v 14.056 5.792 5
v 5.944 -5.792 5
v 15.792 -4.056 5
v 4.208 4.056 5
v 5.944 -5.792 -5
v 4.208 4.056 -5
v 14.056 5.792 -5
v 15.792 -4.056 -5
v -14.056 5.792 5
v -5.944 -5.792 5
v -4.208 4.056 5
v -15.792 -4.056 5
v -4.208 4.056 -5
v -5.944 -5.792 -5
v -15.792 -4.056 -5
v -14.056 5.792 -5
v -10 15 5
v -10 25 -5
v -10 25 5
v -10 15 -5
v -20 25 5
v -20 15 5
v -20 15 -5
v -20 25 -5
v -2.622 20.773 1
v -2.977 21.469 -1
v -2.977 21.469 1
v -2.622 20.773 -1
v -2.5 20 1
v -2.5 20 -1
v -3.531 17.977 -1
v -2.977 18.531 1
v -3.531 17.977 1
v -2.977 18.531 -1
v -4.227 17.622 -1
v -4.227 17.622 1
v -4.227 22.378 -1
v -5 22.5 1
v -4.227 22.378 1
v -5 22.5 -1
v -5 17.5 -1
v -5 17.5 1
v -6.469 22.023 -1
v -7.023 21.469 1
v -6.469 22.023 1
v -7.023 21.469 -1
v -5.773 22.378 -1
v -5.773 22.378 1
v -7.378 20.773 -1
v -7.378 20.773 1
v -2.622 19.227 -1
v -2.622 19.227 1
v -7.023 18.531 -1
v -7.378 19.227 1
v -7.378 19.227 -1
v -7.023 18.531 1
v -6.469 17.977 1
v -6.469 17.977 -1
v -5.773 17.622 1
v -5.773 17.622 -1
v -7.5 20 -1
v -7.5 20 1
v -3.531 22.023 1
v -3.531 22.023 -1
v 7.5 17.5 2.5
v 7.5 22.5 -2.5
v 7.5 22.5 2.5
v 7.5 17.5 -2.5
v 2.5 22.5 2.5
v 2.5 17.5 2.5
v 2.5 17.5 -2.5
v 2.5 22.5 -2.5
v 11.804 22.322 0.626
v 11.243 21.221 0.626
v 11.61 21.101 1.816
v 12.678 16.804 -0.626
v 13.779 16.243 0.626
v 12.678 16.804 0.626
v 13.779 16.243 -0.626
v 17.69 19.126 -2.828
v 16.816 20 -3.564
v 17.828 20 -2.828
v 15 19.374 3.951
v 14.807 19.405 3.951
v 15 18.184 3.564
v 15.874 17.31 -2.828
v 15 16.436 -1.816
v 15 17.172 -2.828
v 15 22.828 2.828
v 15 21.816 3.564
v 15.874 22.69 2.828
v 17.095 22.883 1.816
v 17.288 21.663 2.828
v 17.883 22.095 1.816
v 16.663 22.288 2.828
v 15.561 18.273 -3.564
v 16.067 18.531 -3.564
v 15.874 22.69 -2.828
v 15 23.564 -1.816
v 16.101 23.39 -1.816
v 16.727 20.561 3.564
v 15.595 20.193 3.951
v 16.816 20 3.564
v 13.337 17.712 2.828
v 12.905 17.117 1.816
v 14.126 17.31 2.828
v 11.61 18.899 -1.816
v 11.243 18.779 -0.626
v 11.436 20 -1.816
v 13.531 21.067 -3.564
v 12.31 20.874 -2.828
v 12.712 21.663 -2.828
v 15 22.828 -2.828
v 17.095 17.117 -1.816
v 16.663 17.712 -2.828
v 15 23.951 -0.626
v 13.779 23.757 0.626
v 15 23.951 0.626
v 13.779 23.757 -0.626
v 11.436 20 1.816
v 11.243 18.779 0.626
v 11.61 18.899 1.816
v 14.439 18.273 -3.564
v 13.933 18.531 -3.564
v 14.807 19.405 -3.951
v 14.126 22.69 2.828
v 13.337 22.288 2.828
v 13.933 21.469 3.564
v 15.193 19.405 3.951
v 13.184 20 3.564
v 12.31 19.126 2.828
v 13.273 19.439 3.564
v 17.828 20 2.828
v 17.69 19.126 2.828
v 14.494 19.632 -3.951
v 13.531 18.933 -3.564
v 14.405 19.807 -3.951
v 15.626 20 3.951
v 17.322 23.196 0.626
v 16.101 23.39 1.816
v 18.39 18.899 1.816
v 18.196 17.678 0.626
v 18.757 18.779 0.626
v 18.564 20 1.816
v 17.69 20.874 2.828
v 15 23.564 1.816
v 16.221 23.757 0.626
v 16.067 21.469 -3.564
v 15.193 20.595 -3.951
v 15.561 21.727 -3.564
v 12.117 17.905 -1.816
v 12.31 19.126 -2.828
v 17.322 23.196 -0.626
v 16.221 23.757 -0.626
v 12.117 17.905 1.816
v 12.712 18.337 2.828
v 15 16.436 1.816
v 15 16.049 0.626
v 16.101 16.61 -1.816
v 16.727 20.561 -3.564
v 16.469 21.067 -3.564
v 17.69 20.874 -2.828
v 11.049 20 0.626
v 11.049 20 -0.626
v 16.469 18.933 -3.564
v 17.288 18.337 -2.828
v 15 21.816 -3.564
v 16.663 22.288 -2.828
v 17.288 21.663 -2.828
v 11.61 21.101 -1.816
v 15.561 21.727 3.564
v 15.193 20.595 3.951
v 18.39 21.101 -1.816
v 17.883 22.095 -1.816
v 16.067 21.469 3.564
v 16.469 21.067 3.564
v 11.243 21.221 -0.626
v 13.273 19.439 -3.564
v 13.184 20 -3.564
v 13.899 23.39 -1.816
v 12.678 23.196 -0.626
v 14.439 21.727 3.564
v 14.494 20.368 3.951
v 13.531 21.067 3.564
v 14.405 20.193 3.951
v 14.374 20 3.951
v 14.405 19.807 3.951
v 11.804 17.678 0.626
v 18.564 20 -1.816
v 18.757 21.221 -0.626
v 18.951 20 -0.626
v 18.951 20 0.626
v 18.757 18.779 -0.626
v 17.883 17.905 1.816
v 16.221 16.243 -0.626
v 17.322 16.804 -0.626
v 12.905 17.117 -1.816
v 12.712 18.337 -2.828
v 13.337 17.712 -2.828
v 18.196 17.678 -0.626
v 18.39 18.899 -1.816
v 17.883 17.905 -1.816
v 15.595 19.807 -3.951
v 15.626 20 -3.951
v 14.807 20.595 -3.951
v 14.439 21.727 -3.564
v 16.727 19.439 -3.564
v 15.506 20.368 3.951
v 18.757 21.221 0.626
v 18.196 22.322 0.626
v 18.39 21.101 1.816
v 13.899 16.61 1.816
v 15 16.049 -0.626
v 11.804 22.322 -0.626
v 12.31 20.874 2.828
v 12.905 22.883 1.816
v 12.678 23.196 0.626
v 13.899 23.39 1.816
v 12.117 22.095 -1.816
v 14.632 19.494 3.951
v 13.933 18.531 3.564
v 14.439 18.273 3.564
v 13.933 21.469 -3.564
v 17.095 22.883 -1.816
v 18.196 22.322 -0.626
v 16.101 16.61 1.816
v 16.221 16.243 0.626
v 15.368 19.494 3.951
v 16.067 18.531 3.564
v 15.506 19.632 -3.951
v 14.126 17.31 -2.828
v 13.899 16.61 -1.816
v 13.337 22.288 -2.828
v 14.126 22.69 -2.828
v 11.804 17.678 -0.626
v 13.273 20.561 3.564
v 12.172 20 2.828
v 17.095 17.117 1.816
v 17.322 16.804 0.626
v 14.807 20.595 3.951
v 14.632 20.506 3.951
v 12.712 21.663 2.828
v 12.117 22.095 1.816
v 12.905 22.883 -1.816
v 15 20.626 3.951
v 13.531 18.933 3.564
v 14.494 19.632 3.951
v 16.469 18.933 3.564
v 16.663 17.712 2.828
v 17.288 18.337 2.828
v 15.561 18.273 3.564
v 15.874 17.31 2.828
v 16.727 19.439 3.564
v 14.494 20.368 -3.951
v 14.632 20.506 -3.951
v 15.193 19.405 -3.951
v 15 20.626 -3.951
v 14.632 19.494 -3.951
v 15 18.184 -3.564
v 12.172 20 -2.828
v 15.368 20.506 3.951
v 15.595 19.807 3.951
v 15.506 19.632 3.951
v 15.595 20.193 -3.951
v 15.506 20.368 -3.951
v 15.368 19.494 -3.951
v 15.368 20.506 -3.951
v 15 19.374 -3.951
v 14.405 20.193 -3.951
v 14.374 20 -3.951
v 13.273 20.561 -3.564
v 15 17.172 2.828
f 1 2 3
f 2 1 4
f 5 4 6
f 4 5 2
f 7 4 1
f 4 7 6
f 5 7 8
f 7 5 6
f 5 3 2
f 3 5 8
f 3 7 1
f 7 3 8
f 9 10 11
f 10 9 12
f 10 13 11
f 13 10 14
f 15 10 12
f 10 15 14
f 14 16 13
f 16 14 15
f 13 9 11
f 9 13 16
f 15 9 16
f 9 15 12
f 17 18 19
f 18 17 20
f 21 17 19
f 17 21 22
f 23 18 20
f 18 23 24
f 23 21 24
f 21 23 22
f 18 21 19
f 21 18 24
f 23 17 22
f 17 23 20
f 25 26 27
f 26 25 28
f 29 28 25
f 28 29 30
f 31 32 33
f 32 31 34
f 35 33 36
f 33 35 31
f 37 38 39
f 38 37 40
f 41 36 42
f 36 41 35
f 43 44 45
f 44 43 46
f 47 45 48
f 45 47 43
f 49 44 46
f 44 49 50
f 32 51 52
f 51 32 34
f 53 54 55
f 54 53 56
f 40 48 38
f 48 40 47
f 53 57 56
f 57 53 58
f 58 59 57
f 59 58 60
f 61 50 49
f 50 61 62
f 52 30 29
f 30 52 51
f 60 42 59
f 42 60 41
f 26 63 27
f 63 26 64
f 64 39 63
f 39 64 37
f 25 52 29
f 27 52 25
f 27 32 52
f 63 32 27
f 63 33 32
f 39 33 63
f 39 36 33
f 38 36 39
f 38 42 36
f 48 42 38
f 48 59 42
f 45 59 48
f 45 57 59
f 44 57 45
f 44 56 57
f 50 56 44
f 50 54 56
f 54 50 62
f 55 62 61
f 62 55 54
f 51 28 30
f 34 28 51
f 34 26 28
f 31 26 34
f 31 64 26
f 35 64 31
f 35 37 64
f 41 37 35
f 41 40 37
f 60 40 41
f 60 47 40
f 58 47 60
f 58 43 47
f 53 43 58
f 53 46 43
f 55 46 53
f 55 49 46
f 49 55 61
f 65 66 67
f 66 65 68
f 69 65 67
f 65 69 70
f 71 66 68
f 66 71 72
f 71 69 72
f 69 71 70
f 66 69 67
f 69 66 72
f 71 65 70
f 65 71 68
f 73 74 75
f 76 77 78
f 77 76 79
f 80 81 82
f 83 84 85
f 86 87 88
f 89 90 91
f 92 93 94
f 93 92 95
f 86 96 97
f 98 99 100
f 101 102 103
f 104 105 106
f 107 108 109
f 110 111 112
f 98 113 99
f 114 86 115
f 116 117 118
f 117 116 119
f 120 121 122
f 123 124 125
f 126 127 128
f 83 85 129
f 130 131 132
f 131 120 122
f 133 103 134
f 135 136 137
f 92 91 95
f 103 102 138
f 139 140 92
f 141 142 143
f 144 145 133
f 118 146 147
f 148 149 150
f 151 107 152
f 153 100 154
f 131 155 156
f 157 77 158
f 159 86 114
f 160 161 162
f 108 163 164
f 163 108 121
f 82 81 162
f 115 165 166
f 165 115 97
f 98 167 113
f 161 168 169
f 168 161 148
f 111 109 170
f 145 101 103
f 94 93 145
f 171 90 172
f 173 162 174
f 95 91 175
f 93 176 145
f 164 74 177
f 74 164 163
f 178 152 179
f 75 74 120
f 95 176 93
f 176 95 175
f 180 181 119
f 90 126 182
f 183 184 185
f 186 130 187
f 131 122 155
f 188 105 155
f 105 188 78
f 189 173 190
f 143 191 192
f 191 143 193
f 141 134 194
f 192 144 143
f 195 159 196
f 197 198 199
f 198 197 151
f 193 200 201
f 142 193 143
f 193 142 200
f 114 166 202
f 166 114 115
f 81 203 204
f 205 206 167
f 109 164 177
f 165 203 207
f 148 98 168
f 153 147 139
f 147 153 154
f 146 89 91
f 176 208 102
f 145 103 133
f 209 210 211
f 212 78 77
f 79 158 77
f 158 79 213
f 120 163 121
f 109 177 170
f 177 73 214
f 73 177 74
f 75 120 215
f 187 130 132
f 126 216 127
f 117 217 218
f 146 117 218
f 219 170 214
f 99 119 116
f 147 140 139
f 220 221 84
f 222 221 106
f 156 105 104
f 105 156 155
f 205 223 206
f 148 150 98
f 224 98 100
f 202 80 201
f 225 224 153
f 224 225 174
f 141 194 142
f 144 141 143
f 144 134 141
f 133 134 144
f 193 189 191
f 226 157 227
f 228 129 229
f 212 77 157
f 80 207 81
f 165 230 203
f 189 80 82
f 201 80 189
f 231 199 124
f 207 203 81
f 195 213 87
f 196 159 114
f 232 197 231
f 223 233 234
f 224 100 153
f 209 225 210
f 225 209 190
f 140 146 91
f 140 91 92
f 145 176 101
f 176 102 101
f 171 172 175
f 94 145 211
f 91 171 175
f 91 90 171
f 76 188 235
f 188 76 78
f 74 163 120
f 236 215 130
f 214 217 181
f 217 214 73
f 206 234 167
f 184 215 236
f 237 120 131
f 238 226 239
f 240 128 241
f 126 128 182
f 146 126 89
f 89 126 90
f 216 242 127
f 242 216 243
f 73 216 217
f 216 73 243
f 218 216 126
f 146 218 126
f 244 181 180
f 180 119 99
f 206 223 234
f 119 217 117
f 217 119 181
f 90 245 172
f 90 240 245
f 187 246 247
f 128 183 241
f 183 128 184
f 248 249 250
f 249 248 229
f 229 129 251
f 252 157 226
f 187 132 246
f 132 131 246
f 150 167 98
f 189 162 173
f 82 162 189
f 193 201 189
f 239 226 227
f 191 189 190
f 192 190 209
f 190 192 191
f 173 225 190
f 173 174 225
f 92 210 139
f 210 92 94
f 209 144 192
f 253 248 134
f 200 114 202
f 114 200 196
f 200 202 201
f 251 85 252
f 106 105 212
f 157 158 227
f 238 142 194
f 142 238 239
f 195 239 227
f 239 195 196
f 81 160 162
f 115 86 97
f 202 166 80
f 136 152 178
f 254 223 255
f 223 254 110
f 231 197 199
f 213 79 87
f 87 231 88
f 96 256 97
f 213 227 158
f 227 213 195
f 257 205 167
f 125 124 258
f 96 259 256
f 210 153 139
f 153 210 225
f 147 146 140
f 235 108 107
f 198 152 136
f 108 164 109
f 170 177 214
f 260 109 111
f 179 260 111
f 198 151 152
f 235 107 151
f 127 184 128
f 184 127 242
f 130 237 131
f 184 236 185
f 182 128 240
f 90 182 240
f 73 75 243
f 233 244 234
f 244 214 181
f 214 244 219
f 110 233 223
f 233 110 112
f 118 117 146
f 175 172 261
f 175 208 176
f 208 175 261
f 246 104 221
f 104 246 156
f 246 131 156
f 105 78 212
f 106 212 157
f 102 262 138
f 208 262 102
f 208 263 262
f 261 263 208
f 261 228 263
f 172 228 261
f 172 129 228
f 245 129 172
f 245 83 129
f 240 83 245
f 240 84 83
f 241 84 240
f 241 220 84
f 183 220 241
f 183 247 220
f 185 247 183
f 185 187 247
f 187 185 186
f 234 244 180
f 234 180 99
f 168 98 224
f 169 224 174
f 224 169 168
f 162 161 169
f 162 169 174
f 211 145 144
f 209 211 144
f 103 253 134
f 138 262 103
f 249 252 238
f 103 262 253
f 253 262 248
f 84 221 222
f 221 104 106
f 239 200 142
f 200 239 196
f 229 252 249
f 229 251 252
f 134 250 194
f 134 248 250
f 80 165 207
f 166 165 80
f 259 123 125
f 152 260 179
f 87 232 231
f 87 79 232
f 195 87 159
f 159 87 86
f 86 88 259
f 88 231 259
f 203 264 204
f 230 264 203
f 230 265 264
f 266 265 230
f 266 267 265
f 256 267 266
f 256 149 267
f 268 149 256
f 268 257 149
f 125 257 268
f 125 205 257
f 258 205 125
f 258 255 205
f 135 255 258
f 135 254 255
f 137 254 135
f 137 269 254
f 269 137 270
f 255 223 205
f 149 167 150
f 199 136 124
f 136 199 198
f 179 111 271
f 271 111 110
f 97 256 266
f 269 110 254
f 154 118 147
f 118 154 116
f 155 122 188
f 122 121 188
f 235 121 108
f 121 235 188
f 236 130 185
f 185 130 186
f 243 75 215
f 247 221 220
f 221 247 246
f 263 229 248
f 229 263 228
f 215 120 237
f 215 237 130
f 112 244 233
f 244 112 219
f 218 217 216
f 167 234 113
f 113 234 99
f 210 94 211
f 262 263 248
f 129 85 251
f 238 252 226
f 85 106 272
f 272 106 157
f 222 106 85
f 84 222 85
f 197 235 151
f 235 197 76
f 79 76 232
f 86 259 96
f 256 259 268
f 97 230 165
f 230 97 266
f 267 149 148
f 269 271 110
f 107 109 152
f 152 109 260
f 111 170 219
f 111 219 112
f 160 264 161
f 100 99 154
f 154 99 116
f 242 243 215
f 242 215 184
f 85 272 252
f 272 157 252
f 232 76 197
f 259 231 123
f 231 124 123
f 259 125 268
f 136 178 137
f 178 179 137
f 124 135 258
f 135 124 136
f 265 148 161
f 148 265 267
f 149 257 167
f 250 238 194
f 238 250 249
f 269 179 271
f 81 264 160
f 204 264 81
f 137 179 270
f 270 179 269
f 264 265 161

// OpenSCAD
//
// Licensed under the MIT license. See LICENSE file in the project root for details.
//


module mirror_copy(L)
{
    children();
    mirror(L) children();
}

module repeat_displace(T, center=false)
{
    tx = T[0]; ty = T[1]; tz = T[2];

    module tr_mult(i){translate([tx*i, ty*i, tz*i]) children();}

    tr_mult((center)?-($children-1)/2:0) for(i=[0 : $children-1]) tr_mult(i) children(i);
}


// Demo

module operations__demo()
{
    translate([0, 0, 0]) mirror_copy([1, 0, 0]) translate([10, 0, 0]) rotate([0, 0, 10]) cube(10, center=true);

    translate([0, 20, 0]) repeat_displace([10, 0, 0], center=true){
        cube(10, center=true);
        cylinder(d=5, h=2, center=true, $fn=20);
        cube(5, center=true);
        sphere(d=8, $fn=20);
    }
}

operations__demo();
